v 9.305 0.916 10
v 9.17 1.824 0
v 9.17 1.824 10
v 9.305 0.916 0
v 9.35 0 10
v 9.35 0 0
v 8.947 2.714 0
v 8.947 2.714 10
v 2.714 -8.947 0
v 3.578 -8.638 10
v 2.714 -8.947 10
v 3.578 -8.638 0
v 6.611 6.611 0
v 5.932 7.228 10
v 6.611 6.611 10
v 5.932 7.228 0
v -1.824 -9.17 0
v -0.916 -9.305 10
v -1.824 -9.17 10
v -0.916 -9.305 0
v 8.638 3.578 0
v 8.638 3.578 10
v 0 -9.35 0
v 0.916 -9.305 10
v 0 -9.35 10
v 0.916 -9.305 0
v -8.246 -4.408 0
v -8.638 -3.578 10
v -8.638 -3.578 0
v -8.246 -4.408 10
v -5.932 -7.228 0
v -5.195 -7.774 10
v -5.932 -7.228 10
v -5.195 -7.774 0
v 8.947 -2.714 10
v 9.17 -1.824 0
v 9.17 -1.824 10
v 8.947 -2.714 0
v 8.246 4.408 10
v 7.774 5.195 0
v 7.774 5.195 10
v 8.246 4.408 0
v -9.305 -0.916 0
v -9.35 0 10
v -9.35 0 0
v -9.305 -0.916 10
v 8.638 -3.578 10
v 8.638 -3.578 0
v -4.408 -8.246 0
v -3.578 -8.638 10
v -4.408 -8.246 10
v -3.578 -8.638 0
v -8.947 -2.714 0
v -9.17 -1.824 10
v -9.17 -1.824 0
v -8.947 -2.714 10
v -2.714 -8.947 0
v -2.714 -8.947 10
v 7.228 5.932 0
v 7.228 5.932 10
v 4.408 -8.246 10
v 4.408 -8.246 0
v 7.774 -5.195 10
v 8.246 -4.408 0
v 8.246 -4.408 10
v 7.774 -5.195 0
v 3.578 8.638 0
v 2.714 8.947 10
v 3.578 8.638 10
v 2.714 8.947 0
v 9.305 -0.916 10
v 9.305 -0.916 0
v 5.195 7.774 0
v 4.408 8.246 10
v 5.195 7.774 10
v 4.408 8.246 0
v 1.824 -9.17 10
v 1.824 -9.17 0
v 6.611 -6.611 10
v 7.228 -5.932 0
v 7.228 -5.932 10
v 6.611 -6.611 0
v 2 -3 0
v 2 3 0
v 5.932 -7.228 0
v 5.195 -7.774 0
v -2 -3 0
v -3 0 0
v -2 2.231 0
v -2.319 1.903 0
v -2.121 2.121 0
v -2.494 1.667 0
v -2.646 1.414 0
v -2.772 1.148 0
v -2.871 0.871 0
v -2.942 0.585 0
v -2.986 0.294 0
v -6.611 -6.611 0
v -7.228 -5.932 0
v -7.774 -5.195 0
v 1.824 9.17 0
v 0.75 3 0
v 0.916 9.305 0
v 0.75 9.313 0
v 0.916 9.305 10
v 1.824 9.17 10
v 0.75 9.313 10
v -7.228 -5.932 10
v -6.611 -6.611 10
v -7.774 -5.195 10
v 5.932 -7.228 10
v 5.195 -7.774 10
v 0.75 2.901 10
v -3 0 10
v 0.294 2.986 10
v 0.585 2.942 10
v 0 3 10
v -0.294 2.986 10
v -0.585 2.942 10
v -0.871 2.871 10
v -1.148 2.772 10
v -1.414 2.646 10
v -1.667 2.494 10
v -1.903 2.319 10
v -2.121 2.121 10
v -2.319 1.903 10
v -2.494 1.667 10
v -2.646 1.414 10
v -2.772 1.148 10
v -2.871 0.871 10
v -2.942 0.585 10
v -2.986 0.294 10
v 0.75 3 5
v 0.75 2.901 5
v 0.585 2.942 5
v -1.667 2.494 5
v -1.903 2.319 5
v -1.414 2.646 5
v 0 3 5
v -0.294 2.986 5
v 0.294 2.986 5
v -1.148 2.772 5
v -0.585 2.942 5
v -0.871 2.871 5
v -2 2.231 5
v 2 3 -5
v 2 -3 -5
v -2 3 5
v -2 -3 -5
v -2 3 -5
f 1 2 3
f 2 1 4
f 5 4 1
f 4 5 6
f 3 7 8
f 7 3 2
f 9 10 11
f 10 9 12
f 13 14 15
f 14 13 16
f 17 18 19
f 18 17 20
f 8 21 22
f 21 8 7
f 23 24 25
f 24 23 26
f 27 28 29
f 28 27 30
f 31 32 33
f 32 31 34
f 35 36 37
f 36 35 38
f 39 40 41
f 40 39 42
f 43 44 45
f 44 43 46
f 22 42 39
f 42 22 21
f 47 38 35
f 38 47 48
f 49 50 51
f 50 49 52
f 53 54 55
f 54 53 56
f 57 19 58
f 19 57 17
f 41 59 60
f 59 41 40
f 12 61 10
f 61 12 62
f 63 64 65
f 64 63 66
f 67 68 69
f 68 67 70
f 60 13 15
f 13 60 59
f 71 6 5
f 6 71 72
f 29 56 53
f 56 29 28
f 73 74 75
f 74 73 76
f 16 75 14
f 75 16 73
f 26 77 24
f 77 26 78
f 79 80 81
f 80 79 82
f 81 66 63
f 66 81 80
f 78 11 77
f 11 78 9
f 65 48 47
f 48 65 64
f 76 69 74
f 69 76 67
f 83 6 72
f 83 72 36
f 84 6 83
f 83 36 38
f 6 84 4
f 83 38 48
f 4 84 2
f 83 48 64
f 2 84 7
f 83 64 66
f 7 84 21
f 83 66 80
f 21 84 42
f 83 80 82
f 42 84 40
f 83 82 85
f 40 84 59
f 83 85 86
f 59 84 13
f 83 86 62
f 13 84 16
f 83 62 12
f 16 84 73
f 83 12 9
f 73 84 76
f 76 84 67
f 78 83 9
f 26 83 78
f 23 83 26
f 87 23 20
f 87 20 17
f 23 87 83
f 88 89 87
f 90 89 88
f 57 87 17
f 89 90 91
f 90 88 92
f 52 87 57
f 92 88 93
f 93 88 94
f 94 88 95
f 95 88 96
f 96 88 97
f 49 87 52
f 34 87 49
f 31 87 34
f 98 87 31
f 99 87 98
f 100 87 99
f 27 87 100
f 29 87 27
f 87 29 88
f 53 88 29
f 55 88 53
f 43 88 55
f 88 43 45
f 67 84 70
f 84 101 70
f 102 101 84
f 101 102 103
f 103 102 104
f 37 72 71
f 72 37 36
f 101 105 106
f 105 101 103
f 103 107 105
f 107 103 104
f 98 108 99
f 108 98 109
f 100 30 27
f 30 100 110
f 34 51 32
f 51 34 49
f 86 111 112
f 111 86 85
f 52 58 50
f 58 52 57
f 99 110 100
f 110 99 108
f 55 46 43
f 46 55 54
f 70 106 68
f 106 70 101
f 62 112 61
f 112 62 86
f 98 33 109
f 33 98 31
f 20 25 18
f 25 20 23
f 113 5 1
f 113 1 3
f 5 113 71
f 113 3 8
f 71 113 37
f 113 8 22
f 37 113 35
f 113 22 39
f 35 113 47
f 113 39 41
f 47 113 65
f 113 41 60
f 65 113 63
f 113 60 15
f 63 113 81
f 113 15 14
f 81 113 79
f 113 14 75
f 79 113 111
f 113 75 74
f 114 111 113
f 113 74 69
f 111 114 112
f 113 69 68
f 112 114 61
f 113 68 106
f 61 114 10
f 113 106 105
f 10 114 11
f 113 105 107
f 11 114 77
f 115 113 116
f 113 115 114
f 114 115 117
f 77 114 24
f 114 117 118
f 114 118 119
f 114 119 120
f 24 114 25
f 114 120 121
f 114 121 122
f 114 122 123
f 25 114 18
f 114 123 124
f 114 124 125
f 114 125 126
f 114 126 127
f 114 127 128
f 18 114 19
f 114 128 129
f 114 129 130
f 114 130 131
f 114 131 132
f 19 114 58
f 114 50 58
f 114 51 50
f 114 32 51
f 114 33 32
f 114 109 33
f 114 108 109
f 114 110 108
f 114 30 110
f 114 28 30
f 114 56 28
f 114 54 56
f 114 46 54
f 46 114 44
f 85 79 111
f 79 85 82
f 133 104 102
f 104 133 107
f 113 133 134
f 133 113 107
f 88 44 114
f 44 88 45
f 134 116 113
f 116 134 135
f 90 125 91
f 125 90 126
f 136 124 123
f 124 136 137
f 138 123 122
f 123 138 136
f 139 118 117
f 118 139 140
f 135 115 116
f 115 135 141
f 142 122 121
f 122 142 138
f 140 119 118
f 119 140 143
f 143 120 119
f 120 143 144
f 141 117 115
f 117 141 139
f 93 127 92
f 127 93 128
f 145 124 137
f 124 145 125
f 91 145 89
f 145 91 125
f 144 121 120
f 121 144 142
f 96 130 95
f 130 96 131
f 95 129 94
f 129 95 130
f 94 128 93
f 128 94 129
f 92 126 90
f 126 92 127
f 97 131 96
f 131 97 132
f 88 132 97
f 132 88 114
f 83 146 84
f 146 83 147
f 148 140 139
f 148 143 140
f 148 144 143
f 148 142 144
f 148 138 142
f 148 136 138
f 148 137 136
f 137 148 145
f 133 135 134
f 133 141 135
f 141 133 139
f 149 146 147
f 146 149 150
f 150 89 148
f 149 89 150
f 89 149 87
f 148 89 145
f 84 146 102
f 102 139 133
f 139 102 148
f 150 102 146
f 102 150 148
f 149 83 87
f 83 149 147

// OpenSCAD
// Dimensions for the Snap-On Clip Design

// Overall part height
height_z = 10; // Total extrusion height in Z direction (mm)

// Rod Ring dimensions (Ring 1)
rod_ring_inner_diameter = 12.7; // Inner diameter of the rod ring (mm)
rod_ring_wall_thickness = 3;     // Wall thickness of the rod ring (mm)
rod_ring_outer_diameter = rod_ring_inner_diameter + 2 * rod_ring_wall_thickness; // Calculated outer diameter (18.7 mm)

// Tubing Ring dimensions (Ring 2)
tubing_ring_inner_diameter = 6;  // Inner diameter of the tubing ring (mm)
tubing_ring_wall_thickness = 2;  // Wall thickness of the tubing ring (mm)
tubing_ring_center_x = 15;       // Center X position for the tubing ring (mm)
tubing_ring_center_y = 0;        // Center Y position for the tubing ring (mm)

// Bridge dimensions (Solid Connector)
bridge_width_y = 6;              // Width of the solid bridge in the Y direction (mm)
bridge_start_x = 8;              // Start X position of the bridge (mm)
bridge_end_x = 12;               // End X position of the bridge (mm)

// Cutout dimensions for Ring 1 (Rod Snap)
rod_cutout_width = 10;           // Width of the opening cut out on the -X side (mm)
rod_cutout_y_range = [-5, 5];     // Y range for the cutout on Ring 1

// Cutout dimensions for Ring 2 (Tubing Alignment)
tubing_cutout_width = 4.5;        // Width of the opening cut out on the +X side (mm)
tubing_cutout_y_range = [-2.25, 2.25]; // Y range for the cutout on Ring 2

// Tolerance for cuts (to ensure separation)
tolerance = 0.1; // Small offset for cutting operations

// --- Module Definitions ---

module rod_ring() {
    difference() {
        // Base ring shape (Outer circle)
        cylinder(h = height_z, r = rod_ring_outer_diameter / 2, $fn = 64);

        // Cutout for snapping onto the rod (on the -X side)
        translate([-(rod_ring_outer_diameter / 2) - tolerance, 0, 0]) {
            cube([rod_cutout_width + 2 * tolerance, 10, height_z]); // Cut a block extending past the edge
        }
    }
}

module tubing_ring() {
    difference() {
        // Base ring shape (Outer circle)
        cylinder(h = height_z, r = tubing_ring_inner_diameter / 2, $fn = 64);

        // Cutout for tubing alignment (on the +X side)
        translate([tubing_ring_center_x + tubing_ring_wall_thickness + tolerance, 0, 0]) {
            cube([tubing_cutout_width + 2 * tolerance, 10, height_z]); // Cut a block extending past the edge
        }
    }
}

module bridge() {
    // Solid rectangular bridge connecting the rings
    cube([bridge_end_x - bridge_start_x, bridge_width_y, height_z], center = true);
}

// --- Main Assembly ---

union() {
    rod_ring();
    tubing_ring();
    bridge();
}
